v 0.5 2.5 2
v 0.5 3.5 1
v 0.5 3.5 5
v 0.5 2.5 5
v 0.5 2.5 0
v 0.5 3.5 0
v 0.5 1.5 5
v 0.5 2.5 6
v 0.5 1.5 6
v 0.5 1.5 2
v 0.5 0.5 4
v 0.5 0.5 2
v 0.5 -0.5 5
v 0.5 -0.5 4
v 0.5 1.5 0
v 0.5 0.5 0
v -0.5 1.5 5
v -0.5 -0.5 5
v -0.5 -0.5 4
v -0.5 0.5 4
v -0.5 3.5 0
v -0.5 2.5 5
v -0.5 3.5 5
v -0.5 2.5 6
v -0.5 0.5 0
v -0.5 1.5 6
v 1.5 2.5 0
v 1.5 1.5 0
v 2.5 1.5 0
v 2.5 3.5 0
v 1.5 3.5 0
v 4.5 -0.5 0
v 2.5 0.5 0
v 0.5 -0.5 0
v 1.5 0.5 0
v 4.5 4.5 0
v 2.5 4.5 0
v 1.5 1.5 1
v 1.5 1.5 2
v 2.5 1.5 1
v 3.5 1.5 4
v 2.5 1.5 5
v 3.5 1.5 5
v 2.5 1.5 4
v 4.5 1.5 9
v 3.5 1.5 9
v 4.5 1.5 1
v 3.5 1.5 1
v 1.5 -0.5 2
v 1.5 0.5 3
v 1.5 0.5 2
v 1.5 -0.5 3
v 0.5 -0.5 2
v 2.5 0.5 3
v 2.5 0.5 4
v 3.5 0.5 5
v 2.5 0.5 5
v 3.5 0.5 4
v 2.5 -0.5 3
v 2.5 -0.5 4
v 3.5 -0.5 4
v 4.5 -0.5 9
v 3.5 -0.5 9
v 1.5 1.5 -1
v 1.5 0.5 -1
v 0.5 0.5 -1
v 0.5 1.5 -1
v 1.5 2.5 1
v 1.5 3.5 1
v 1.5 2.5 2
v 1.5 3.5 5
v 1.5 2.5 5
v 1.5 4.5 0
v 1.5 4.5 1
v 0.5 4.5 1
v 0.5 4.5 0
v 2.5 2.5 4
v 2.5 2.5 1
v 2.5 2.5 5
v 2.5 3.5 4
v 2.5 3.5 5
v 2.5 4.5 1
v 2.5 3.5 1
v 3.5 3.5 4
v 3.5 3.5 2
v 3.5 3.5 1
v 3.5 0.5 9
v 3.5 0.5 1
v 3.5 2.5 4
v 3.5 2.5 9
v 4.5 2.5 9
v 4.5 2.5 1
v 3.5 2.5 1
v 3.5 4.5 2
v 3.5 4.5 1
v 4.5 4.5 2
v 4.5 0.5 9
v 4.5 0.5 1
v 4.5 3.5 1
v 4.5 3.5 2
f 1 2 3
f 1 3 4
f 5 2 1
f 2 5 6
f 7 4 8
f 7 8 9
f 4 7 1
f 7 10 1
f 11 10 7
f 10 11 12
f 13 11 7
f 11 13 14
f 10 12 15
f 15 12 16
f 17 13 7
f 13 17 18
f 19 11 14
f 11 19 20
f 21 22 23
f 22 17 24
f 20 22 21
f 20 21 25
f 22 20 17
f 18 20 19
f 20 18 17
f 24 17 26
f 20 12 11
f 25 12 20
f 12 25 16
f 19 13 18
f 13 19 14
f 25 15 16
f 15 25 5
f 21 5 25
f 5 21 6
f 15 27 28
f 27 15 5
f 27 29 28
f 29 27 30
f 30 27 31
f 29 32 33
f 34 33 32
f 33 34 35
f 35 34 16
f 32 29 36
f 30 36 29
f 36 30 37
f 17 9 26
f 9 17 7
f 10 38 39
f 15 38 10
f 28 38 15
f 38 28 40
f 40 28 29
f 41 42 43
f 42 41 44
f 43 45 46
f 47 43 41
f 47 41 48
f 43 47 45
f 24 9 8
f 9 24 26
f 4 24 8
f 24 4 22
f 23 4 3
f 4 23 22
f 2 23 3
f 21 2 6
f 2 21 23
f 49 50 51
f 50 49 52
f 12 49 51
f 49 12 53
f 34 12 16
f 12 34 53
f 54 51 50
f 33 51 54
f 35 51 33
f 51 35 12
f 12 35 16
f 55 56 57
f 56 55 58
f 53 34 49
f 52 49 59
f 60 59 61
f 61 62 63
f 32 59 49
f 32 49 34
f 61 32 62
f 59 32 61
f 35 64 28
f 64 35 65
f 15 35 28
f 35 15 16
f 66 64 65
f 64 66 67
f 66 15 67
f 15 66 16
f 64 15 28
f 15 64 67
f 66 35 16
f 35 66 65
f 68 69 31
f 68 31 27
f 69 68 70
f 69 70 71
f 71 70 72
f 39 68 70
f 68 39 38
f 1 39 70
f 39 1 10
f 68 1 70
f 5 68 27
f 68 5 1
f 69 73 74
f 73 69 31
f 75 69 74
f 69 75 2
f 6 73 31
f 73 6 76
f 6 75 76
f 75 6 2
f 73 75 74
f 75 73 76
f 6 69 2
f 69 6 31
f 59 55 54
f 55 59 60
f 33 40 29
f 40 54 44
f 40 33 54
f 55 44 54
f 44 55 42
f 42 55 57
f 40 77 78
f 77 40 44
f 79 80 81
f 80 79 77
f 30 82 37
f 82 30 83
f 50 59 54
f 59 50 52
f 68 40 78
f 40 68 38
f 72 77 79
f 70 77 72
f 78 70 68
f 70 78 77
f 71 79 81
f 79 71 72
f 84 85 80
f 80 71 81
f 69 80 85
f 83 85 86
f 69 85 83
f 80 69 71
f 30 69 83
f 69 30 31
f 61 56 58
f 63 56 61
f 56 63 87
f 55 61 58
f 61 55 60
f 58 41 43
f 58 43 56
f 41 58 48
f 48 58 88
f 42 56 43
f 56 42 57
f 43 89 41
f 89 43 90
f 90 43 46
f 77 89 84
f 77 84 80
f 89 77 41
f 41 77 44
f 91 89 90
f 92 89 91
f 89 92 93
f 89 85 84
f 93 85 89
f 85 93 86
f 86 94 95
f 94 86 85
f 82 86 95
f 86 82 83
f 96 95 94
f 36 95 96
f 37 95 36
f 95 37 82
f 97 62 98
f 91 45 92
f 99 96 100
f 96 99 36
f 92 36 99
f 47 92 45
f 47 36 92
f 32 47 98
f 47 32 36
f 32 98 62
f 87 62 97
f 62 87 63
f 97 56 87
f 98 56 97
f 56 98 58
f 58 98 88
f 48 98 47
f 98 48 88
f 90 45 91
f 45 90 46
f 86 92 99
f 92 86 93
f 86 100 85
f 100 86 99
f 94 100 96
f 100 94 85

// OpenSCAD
union() {
    translate([0, 0, 4.5]) color([1, 0, 0]) cube([1, 1, 1], center=true);
    translate([0, 1, 2.5]) cube([1, 1, 5], center=true);
    translate([0, 2, 3.0]) cube([1, 1, 6], center=true);
    translate([0, 3, 2.5]) cube([1, 1, 5], center=true);
    translate([1, 0, 1.0]) cube([1, 1, 2], center=true);
    translate([1, 1, -0.5]) color([0, 0, 1]) cube([1, 1, 1], center=true);
    translate([1, 2, 1.0]) cube([1, 1, 2], center=true);
    translate([1, 4, 0.5]) cube([1, 1, 1], center=true);
    translate([2, 0, 1.5]) cube([1, 1, 3], center=true);
    translate([2, 2, 0.5]) cube([1, 1, 1], center=true);
    translate([2, 3, 2.5]) cube([1, 1, 5], center=true);
    translate([3, 0, 2.0]) cube([1, 1, 4], center=true);
    translate([3, 1, 2.5]) cube([1, 1, 5], center=true);
    translate([3, 2, 2.0]) cube([1, 1, 4], center=true);
    translate([3, 3, 2.0]) cube([1, 1, 4], center=true);
    translate([3, 4, 0.5]) cube([1, 1, 1], center=true);
    translate([4, 0, 4.5]) cube([1, 1, 9], center=true);
    translate([4, 1, 0.5]) cube([1, 1, 1], center=true);
    translate([4, 2, 4.5]) cube([1, 1, 9], center=true);
    translate([4, 3, 0.5]) cube([1, 1, 1], center=true);
    translate([4, 4, 1.0]) cube([1, 1, 2], center=true);
}
